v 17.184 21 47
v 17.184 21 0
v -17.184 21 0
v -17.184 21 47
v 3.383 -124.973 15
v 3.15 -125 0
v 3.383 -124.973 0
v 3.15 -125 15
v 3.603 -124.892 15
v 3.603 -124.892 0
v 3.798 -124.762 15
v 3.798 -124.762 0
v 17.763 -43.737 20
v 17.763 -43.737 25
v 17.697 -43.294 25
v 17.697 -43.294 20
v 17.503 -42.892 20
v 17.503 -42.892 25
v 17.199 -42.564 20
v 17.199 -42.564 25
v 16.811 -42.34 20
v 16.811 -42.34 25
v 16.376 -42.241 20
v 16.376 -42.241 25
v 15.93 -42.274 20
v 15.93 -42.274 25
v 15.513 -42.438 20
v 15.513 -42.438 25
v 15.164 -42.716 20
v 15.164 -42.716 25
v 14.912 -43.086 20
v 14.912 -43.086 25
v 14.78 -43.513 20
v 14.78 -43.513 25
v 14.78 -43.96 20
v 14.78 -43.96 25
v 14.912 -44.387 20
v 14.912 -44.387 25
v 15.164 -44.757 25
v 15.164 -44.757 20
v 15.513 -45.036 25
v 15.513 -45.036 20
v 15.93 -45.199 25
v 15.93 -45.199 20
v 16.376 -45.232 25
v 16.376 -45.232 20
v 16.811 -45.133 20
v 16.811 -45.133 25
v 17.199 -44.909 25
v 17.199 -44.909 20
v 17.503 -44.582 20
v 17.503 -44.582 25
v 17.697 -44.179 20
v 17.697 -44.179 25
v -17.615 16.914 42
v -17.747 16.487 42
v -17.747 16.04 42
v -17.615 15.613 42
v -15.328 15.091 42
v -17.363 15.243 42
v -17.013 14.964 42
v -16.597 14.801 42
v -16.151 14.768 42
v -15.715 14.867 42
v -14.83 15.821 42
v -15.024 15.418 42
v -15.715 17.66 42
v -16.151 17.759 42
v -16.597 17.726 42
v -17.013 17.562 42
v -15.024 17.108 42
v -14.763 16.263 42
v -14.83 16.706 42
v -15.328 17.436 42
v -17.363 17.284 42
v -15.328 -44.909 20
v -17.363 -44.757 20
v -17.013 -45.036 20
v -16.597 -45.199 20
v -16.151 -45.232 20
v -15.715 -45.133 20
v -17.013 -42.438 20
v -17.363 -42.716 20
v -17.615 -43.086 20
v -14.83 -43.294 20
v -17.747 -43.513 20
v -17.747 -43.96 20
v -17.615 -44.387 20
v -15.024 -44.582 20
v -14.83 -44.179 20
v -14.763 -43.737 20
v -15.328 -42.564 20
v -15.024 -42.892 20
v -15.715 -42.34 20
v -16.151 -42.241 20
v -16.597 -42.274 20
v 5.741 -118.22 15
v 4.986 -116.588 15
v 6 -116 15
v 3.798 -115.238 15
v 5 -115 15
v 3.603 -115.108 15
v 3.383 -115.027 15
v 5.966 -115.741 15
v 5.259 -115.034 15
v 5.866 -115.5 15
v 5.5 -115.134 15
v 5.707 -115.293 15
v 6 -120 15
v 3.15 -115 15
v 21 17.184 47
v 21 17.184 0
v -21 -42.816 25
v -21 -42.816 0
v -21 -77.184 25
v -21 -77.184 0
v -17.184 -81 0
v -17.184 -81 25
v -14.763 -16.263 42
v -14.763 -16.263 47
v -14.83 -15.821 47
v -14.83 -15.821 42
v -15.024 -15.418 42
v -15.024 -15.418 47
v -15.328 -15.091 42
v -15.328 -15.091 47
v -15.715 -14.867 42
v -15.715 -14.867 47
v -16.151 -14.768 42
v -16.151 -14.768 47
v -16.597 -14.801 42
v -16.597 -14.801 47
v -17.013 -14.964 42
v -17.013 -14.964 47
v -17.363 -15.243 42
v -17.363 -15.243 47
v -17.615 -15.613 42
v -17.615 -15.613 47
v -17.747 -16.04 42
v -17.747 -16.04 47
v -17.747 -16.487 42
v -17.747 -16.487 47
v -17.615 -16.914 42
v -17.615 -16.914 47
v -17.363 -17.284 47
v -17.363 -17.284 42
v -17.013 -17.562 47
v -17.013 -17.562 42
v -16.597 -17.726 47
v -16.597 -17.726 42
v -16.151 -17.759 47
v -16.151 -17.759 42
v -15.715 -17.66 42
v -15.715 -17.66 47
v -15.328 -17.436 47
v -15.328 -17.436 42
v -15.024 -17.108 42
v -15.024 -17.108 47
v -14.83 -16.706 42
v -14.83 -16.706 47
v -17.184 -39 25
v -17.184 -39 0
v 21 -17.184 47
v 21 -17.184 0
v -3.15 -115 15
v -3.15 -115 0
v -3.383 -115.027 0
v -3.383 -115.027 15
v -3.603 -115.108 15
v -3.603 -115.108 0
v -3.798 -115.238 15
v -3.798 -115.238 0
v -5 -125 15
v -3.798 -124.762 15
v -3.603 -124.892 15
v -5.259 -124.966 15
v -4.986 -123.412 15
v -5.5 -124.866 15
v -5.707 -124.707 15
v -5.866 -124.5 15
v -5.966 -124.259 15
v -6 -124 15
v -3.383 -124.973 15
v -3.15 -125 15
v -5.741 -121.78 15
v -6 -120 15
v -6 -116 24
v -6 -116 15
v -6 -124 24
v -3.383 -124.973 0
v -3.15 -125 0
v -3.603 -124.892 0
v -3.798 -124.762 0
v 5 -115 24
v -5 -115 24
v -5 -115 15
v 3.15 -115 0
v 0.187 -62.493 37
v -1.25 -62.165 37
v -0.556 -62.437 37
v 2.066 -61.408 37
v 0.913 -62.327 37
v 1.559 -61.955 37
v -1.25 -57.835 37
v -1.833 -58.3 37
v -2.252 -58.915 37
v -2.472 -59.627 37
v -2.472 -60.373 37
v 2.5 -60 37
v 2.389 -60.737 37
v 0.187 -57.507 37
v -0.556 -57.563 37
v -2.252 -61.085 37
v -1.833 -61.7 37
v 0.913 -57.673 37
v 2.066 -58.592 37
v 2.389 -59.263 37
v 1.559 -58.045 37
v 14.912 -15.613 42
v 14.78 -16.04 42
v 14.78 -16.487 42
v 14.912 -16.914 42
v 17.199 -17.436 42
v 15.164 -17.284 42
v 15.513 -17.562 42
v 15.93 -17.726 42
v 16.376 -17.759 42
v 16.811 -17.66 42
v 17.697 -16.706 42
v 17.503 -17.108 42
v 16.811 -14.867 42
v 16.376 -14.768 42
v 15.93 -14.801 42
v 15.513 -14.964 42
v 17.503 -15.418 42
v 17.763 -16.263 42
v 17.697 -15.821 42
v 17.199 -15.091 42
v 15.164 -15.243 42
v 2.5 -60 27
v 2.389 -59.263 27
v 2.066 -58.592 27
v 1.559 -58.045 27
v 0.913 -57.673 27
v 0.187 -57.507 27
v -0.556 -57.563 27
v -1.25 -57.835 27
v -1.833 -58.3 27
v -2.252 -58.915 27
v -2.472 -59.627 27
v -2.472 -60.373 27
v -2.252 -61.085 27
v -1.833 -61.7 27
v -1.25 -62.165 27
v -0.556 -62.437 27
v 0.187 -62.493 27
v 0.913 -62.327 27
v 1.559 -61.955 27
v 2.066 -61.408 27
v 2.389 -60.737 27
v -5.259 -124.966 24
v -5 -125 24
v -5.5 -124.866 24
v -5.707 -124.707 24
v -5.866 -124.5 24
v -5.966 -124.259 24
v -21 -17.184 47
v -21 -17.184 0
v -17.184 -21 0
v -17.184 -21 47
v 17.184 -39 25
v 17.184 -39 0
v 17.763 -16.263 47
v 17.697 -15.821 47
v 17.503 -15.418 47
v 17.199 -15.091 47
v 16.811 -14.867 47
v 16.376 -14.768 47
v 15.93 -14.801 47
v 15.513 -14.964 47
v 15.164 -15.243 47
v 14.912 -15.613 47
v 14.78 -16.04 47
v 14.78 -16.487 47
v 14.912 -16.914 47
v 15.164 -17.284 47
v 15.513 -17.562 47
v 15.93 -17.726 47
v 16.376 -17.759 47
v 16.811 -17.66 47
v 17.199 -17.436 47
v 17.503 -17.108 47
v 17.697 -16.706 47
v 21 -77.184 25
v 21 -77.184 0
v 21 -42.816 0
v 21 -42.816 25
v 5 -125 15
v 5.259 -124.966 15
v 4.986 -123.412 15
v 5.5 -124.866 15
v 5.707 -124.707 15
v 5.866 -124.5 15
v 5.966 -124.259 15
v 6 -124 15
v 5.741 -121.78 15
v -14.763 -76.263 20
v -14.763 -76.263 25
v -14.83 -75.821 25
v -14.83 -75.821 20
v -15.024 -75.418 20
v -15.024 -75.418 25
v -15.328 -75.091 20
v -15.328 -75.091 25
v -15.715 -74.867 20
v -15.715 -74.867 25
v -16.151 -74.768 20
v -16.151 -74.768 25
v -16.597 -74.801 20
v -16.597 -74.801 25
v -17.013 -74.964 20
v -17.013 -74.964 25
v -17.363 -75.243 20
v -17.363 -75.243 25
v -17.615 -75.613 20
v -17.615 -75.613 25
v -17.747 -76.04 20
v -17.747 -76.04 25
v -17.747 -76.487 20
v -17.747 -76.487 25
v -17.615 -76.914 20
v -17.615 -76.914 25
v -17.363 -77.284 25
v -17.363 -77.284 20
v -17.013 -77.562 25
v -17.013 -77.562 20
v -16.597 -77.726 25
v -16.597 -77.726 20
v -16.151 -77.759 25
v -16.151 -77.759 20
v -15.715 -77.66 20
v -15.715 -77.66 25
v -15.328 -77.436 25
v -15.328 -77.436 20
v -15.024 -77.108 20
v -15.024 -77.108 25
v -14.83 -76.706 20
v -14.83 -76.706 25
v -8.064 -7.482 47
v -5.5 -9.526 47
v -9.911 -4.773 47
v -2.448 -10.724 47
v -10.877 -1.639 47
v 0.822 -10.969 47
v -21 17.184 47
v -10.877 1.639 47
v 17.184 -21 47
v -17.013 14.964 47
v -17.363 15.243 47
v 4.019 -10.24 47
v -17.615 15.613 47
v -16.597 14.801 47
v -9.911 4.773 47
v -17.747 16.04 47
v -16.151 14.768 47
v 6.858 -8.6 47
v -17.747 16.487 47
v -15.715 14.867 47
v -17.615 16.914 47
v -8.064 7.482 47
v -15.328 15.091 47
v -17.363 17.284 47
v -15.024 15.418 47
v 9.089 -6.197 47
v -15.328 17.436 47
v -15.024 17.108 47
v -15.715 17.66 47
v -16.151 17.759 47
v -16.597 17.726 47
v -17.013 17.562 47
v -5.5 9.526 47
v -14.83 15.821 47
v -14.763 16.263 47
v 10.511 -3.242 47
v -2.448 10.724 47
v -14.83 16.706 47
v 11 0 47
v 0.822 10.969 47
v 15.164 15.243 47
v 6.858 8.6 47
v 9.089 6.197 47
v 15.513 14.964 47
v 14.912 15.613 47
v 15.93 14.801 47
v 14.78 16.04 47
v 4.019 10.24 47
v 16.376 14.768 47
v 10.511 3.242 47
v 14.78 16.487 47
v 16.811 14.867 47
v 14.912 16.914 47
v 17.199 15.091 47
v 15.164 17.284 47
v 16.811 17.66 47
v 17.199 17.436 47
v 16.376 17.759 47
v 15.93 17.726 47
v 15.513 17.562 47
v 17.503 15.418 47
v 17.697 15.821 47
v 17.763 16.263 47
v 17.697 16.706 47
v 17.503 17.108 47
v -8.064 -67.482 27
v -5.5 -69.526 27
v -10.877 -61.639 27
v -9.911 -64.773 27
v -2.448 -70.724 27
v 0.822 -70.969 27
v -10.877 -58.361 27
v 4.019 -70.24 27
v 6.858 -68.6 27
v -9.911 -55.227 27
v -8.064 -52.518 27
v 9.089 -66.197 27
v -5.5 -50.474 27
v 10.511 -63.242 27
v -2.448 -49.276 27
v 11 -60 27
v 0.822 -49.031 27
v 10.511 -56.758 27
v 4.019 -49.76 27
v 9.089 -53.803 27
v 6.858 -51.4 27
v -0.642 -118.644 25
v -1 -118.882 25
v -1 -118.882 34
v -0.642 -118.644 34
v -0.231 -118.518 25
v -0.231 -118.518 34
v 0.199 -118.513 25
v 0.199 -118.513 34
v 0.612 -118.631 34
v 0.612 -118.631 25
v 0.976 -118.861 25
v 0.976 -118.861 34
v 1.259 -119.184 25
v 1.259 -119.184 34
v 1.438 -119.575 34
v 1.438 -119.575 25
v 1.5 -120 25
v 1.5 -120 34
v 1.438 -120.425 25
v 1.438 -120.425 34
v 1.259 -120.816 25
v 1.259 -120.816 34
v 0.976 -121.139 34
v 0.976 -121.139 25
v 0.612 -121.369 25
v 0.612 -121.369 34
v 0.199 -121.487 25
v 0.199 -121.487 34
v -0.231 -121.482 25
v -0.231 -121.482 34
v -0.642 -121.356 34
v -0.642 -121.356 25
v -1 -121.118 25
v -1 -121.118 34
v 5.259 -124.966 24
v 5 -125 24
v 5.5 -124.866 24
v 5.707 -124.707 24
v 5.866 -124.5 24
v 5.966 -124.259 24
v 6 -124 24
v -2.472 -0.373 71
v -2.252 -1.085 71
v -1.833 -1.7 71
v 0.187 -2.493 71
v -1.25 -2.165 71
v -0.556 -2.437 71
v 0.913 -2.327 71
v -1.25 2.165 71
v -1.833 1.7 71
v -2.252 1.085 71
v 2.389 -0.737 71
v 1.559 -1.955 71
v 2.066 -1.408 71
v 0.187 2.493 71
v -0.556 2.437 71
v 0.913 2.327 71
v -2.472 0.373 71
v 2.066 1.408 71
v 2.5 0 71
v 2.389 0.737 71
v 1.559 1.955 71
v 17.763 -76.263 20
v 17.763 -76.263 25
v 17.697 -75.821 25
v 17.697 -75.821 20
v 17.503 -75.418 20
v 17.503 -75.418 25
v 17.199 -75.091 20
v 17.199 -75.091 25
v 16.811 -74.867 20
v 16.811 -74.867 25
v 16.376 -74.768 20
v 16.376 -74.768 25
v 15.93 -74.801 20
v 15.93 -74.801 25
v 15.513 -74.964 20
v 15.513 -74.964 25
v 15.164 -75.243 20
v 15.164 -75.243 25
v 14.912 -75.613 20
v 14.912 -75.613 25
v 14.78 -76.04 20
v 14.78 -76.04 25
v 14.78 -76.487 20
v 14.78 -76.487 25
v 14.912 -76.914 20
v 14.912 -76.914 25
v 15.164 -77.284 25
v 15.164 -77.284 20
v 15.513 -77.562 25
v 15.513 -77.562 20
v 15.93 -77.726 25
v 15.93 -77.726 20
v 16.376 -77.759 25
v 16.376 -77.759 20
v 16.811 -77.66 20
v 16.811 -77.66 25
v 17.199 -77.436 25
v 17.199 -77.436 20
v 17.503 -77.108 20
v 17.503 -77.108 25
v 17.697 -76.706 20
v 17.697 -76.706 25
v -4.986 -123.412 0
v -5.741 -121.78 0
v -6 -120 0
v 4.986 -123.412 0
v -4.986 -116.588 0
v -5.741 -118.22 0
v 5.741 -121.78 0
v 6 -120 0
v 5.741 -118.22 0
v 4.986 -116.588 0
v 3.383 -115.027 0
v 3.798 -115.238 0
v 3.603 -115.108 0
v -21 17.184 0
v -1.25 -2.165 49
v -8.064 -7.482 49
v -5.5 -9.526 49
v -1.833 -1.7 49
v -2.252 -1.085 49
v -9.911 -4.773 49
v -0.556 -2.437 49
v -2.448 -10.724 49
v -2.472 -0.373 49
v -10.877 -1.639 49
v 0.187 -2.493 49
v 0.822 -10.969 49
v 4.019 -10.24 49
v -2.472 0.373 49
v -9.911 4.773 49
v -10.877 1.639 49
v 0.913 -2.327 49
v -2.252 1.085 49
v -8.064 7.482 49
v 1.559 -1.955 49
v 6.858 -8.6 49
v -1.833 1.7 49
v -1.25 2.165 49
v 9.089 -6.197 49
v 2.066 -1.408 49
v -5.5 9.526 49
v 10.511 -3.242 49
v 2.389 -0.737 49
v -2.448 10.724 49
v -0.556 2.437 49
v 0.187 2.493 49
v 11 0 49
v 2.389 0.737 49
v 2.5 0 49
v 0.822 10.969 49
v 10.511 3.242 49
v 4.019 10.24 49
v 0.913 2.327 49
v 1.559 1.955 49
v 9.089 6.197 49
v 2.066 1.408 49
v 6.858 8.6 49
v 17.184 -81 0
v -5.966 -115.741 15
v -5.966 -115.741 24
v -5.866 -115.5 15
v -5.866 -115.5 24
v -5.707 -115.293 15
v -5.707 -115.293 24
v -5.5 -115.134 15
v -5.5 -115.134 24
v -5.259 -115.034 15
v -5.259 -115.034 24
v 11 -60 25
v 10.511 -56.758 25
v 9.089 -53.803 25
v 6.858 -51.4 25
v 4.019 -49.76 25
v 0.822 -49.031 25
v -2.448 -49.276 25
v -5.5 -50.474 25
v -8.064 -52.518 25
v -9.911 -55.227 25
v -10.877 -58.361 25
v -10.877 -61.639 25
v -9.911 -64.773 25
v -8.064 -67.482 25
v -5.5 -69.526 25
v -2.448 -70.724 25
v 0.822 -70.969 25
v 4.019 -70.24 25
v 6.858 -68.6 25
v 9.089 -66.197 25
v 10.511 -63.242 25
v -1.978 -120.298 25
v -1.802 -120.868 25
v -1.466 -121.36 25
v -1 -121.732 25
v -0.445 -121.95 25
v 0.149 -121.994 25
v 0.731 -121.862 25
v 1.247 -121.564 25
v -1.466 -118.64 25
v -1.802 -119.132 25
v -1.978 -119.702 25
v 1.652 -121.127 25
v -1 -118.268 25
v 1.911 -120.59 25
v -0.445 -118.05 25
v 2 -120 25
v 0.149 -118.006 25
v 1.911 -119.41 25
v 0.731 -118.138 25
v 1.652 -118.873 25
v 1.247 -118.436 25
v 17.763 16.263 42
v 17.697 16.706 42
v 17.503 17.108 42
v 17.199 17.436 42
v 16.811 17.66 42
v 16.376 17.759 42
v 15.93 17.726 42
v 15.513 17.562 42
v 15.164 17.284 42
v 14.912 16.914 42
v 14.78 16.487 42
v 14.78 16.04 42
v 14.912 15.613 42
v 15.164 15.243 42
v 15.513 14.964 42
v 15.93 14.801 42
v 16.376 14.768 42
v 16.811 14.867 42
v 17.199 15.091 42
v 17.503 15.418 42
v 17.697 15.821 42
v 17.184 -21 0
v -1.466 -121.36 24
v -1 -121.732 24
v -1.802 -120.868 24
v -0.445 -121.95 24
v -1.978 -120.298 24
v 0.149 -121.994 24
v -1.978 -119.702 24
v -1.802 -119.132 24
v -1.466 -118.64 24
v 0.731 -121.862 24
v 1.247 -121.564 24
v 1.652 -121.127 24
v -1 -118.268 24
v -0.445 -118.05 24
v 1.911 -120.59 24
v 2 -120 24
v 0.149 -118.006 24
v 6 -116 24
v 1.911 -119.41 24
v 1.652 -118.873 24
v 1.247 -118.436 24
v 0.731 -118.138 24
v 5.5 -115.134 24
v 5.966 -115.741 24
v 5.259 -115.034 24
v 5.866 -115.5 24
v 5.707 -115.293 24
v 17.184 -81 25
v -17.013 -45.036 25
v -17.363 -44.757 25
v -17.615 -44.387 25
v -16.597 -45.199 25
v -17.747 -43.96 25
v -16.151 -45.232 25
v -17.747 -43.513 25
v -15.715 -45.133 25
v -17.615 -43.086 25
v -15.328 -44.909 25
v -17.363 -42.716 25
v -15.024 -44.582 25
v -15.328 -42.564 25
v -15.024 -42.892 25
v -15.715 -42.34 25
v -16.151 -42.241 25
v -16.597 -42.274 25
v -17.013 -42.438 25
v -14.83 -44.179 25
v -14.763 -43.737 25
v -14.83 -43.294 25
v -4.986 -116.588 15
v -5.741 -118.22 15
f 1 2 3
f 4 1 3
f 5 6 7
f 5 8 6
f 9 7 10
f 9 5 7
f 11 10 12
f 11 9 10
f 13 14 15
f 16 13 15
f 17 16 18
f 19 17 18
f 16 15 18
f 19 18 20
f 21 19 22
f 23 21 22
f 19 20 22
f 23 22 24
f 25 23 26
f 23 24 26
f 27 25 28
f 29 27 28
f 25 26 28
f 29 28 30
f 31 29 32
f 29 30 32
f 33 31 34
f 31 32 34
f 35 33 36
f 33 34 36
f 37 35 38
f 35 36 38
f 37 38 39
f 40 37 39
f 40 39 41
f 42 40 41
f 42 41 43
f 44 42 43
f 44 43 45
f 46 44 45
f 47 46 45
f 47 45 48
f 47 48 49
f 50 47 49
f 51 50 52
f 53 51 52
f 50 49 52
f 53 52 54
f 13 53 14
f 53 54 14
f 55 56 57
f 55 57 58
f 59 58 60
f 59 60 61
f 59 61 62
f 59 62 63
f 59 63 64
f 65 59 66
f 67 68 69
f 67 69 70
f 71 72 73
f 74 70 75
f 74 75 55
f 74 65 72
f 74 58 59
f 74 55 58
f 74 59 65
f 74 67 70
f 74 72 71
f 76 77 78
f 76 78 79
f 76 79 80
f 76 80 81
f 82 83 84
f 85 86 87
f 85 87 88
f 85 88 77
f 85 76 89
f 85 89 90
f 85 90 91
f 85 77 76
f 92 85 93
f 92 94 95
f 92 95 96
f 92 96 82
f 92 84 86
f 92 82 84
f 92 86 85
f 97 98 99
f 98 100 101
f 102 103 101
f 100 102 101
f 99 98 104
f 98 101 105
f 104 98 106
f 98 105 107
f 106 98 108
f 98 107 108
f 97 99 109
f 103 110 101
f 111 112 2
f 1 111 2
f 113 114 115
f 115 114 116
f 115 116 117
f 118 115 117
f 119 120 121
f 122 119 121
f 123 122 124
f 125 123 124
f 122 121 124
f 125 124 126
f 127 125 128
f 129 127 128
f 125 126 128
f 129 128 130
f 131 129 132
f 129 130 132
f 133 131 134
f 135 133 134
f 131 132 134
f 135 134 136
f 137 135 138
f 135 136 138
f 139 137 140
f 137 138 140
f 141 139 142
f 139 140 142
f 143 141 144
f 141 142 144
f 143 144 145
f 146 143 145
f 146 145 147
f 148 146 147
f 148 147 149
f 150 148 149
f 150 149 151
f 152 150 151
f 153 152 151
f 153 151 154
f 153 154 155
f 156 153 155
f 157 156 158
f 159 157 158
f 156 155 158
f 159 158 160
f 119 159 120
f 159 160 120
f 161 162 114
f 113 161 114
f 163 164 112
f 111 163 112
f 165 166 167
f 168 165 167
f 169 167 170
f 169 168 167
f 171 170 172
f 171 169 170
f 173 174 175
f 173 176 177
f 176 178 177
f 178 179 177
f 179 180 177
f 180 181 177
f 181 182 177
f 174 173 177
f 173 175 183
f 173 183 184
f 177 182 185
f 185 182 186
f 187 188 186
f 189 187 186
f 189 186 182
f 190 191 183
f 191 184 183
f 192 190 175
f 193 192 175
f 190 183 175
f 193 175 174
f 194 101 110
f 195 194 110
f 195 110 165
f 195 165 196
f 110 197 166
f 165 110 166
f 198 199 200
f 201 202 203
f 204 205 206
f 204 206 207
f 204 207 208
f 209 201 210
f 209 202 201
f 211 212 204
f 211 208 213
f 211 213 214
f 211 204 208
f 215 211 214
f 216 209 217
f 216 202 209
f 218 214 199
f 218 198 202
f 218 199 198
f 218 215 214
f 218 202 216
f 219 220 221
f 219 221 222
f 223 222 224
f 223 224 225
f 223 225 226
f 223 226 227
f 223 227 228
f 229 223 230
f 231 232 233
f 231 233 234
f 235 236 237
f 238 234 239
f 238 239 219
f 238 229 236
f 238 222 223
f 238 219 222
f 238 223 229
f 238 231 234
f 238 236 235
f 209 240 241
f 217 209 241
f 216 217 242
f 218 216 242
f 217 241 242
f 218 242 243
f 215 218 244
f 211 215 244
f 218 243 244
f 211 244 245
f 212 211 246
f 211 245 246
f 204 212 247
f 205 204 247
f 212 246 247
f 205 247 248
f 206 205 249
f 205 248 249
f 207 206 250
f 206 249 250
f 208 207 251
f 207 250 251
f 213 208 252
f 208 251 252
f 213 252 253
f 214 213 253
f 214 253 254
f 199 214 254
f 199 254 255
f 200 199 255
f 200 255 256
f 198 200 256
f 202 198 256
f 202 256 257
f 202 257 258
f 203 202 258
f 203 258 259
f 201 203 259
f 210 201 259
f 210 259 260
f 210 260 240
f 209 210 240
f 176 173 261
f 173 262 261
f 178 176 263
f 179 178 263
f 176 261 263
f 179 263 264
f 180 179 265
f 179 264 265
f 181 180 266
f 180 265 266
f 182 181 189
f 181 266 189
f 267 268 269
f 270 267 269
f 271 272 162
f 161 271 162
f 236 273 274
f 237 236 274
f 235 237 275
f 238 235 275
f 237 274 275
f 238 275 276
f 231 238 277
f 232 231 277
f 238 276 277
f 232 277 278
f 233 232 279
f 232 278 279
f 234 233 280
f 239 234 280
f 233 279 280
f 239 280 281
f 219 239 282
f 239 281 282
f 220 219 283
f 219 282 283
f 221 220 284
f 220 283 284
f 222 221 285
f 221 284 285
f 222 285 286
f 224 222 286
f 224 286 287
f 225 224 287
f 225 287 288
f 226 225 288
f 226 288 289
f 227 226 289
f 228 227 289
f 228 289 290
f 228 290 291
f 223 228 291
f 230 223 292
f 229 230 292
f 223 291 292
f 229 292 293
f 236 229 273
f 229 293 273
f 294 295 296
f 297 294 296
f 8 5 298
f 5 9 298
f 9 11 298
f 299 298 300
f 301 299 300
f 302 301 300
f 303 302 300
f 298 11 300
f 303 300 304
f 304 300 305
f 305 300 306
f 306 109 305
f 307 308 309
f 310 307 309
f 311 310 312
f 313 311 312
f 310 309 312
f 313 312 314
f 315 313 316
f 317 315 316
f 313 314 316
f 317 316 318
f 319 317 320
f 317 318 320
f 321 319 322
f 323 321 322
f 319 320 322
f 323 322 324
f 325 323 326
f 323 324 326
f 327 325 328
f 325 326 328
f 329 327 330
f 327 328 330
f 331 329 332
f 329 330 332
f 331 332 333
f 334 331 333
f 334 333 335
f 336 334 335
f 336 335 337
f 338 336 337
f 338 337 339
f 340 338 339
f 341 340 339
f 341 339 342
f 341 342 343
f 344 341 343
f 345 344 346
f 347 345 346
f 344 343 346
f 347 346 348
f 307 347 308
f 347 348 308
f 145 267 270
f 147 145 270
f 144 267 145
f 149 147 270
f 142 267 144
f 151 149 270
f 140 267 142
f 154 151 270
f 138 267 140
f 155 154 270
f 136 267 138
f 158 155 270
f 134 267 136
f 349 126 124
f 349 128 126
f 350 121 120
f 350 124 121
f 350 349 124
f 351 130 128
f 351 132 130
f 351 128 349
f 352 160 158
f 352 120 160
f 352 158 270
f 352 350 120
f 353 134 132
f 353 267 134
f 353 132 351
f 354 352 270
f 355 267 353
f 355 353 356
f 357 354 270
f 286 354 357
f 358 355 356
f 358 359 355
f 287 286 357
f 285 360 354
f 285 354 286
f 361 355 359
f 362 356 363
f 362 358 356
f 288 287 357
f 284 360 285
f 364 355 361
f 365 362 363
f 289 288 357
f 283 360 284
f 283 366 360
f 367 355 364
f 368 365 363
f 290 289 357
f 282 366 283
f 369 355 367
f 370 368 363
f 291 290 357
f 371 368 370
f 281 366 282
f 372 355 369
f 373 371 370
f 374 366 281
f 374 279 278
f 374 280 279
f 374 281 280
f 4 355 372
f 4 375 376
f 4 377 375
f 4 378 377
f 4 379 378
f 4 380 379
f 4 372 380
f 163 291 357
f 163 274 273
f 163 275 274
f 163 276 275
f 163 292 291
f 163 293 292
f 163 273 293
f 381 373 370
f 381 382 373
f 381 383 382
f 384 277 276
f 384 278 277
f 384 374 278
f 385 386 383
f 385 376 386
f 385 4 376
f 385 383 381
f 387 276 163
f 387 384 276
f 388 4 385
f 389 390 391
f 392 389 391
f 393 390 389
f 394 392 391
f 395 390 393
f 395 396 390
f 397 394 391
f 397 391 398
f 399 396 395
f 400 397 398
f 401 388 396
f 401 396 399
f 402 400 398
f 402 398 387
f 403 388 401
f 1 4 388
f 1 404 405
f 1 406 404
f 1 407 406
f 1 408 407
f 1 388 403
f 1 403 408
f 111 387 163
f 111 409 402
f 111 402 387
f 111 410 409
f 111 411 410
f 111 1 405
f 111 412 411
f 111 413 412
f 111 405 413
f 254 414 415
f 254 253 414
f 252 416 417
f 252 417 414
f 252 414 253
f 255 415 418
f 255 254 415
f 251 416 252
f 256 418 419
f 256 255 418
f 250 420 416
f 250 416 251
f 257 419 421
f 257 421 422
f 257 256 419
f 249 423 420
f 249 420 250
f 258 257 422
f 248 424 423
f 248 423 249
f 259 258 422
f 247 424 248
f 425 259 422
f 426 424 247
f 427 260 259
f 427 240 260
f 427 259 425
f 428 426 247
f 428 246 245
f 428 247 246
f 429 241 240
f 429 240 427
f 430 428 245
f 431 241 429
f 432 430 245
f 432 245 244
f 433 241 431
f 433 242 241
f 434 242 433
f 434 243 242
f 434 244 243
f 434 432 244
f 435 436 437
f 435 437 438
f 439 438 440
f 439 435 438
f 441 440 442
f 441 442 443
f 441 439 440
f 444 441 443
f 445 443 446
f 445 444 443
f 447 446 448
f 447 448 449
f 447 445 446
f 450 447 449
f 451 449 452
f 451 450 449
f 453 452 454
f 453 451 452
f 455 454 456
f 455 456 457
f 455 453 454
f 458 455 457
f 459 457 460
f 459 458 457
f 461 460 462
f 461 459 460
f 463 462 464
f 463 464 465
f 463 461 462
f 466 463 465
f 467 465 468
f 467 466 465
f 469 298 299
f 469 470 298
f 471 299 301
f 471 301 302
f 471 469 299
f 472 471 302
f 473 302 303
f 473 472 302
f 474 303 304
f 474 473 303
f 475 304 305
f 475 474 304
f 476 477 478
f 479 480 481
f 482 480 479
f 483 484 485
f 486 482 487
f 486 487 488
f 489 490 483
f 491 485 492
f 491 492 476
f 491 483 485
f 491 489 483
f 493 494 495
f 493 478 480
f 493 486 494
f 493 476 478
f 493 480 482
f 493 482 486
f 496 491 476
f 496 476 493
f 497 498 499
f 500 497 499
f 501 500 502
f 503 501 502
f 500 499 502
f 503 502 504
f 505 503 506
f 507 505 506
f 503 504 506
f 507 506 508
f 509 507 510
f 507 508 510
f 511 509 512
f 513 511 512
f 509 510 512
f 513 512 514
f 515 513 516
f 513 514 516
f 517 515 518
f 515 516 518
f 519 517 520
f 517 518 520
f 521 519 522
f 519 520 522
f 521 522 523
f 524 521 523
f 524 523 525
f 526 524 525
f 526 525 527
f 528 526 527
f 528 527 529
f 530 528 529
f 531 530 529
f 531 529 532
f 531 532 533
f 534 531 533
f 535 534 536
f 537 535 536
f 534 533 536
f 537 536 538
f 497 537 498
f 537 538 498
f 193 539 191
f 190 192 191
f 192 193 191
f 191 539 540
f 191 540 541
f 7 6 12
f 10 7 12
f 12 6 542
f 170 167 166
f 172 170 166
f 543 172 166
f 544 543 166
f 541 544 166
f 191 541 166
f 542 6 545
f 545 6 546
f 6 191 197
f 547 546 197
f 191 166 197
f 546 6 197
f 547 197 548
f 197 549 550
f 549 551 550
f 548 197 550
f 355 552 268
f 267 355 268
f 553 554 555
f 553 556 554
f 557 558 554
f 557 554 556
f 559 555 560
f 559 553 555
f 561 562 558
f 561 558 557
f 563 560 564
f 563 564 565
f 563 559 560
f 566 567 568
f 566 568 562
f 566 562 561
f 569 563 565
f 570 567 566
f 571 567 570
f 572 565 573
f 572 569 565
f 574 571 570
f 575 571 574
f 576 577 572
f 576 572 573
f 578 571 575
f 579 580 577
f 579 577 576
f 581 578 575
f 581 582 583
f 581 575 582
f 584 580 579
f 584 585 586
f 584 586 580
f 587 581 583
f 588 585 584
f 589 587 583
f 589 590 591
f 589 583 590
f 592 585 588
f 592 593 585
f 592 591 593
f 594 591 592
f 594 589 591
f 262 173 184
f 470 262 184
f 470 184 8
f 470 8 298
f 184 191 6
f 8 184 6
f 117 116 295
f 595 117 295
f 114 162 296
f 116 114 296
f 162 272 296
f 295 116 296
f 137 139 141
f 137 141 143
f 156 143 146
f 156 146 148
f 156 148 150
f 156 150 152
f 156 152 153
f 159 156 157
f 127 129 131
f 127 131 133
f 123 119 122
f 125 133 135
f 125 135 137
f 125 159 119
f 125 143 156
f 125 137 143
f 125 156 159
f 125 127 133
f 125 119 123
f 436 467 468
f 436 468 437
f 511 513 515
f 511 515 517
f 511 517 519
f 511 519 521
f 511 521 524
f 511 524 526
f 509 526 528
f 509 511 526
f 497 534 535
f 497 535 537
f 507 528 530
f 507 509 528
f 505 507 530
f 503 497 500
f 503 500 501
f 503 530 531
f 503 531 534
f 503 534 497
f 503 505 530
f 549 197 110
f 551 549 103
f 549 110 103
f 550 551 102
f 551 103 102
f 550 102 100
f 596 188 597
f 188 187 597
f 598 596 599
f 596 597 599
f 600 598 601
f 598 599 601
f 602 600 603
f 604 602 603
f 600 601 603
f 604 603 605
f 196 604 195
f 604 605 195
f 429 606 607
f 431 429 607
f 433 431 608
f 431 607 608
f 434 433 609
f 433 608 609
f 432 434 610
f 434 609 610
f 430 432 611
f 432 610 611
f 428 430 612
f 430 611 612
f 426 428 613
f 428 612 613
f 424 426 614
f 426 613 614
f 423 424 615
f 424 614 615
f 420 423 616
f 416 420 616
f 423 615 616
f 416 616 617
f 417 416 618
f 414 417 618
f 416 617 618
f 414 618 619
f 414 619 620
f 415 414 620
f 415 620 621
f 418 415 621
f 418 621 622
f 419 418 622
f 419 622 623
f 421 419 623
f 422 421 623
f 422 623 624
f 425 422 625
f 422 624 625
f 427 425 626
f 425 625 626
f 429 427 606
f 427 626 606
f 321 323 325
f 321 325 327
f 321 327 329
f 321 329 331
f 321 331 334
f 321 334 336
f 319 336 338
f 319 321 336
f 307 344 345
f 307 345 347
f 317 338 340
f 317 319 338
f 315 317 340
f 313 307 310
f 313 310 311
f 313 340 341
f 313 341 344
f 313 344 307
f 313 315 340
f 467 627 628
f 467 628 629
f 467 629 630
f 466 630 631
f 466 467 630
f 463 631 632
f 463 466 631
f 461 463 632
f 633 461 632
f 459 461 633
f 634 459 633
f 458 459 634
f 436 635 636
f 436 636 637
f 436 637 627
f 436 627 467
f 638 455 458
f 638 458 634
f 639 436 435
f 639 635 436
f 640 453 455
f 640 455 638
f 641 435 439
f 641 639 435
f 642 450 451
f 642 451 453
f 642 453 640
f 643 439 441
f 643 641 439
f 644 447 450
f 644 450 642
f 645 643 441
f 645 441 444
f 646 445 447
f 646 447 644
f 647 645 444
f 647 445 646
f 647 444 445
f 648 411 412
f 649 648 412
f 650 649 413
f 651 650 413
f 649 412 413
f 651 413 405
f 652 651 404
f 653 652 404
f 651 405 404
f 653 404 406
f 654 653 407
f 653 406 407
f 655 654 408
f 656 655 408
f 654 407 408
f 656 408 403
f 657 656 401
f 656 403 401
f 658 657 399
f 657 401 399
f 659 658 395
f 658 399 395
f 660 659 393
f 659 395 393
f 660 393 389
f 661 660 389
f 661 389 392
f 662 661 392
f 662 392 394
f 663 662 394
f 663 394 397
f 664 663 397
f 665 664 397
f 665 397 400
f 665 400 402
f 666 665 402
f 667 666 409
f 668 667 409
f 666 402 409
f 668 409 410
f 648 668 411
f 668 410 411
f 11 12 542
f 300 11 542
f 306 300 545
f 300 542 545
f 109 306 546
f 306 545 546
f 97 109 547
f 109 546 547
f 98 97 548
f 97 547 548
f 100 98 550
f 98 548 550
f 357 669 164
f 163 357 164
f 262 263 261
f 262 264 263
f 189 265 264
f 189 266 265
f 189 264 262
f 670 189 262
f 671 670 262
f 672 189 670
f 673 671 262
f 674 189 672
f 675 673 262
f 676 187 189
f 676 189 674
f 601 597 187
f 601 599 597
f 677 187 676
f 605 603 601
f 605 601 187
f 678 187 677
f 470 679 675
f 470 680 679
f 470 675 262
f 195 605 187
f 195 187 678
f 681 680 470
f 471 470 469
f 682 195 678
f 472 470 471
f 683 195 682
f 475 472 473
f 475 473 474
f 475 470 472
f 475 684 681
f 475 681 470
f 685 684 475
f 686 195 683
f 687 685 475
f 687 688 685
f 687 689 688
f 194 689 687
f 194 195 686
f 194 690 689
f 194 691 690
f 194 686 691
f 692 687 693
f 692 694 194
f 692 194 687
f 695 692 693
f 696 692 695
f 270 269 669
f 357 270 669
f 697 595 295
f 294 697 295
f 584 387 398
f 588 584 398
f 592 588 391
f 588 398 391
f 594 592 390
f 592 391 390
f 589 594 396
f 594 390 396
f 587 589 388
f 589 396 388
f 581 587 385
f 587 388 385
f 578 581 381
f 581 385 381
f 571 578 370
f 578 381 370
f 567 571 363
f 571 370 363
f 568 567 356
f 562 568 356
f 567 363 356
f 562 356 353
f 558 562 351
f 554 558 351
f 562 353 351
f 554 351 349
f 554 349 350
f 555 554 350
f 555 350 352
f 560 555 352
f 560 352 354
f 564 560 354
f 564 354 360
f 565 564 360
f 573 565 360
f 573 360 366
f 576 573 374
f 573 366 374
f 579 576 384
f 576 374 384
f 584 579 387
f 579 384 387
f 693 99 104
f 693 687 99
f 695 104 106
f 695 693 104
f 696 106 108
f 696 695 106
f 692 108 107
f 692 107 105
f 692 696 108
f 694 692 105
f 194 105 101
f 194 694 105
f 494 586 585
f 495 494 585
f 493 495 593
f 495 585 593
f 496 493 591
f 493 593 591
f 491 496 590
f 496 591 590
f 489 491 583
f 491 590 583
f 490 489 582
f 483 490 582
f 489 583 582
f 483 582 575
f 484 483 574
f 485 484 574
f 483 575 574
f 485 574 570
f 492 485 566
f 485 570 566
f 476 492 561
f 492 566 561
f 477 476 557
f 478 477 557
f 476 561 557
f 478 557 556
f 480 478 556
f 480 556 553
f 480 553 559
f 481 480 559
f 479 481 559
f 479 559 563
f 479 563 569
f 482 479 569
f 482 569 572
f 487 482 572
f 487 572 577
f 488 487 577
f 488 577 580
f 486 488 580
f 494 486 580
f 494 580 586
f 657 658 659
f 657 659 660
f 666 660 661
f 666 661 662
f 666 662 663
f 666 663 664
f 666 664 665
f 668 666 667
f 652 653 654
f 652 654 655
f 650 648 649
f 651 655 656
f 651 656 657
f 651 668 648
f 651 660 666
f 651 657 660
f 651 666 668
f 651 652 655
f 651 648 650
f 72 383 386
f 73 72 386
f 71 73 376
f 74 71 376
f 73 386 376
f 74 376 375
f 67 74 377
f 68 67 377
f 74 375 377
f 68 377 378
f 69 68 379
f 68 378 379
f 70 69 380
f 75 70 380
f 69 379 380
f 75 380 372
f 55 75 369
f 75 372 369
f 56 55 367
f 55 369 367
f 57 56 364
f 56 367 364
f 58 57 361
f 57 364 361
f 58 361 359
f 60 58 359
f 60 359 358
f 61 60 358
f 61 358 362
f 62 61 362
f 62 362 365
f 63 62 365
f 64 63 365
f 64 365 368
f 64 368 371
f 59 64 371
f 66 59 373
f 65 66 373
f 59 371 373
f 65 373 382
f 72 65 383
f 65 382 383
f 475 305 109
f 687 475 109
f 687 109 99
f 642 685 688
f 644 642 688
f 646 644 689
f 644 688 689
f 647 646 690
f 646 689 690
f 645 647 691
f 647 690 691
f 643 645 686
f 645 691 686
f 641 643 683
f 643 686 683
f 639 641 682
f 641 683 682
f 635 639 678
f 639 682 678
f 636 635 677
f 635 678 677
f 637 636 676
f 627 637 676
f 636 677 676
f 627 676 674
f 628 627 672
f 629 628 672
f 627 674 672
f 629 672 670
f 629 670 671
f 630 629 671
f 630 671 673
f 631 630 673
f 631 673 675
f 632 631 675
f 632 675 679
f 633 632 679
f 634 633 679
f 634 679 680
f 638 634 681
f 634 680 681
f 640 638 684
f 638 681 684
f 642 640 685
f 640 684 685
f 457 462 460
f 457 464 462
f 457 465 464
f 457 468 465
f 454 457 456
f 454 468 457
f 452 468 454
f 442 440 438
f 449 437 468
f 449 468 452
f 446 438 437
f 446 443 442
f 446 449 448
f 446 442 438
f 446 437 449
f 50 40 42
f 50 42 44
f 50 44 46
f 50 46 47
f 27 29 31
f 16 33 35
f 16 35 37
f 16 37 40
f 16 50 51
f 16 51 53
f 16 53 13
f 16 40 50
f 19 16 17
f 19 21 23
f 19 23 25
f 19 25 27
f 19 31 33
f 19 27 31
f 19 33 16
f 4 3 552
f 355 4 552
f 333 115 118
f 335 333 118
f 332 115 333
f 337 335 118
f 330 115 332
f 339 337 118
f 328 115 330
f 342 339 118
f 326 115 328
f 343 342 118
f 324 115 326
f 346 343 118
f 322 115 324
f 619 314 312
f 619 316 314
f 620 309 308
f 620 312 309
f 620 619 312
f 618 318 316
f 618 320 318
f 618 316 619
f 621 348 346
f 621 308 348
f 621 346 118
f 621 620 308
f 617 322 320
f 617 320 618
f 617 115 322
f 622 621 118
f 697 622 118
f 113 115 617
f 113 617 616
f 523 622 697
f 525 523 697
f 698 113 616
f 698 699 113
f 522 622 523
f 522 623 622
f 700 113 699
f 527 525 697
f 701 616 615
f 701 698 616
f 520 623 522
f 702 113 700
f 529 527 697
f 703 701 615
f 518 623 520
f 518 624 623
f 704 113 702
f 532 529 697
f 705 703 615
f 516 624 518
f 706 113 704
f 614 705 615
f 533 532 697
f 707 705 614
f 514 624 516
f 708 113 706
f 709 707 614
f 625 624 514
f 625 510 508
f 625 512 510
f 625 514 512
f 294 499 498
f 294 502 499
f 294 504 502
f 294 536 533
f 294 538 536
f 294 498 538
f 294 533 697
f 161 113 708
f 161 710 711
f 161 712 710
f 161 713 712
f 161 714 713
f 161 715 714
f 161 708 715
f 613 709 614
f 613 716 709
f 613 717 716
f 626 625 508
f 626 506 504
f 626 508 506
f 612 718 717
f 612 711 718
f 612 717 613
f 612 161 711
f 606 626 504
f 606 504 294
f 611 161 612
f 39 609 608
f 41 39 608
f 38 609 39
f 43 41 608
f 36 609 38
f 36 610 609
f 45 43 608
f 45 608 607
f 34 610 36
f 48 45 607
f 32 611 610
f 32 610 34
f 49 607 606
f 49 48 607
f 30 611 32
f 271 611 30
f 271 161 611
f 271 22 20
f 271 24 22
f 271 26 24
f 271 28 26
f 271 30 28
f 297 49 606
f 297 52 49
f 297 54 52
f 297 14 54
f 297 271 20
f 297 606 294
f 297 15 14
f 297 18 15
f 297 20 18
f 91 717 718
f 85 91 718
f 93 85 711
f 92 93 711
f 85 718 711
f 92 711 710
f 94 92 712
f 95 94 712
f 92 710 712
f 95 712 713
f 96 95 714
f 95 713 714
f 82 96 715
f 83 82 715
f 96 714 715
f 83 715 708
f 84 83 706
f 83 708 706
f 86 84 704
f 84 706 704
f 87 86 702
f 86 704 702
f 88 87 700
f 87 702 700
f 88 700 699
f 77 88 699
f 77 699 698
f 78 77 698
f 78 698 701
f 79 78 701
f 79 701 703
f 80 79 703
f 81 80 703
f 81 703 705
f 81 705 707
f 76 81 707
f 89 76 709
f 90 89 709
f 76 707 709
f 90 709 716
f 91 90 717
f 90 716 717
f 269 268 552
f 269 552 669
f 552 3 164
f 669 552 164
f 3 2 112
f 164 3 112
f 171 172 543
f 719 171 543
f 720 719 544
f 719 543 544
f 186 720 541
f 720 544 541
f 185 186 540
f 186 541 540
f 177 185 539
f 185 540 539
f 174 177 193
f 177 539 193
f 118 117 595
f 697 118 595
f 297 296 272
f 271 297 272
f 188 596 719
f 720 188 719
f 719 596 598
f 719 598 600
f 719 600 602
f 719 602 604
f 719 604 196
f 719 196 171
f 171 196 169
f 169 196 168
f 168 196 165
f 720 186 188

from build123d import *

# Parameters (mm, degrees)
F3_DEPTH  = 47
F4_R      = 11
F4_R_2    = 2.5
F5_DEPTH  = 2
F6_DEPTH  = 24
F4_R_3    = 1.5
F7_DEPTH  = 5
F8_DEPTH  = 25
F9_R      = 1.5
F10_DEPTH = 5
F9_R_2    = 11
F9_R_3    = 2.5
F11_DEPTH = 2
F12_DEPTH = 12
F14_DEPTH = 15
F16_DEPTH = 9
F17_R     = 2
F18_DEPTH = 1
F19_DEPTH = 10
F20_R     = 1
F21_R     = 1


with BuildPart() as f3:
    # F2 (on Top) → F3 (new body)
    with BuildSketch(Plane.XY):
        Polygon((-17.1837661841, 21), (-21, 17.1837661841), (-21, -17.1837661841), (-17.1837661841, -21), (17.1837661841, -21), (21, -17.1837661841), (21, 17.1837661841), (17.1837661841, 21), align=None)
    extrude(amount=F3_DEPTH)

    # F4 (on face) → F5 (join)
    with BuildSketch(Plane.XY.offset(47)):
        Circle(F4_R)
        Circle(F4_R_2, mode=Mode.SUBTRACT)
    extrude(amount=F5_DEPTH)

    # F6 (add): a face of the model
    f6_faces = [f3.faces().sort_by_distance(p)[0] for p in [
        (0, 0, 47),
    ]]
    extrude(f6_faces, amount=F6_DEPTH)

    # F4 (on face) → F7 (cut)
    with BuildSketch(Plane.XY.offset(47)):
        with Locations((16.2634559673, -16.2634559673)):
            Circle(F4_R_3)
        with Locations((16.2634559673, 16.2634559673)):
            Circle(F4_R_3)
        with Locations((-16.2634559673, 16.2634559673)):
            Circle(F4_R_3)
        with Locations((-16.2634559673, -16.2634559673)):
            Circle(F4_R_3)
    extrude(amount=-F7_DEPTH, mode=Mode.SUBTRACT)


with BuildPart() as f8:
    # F2 (on Top) → F8 (new body)
    with BuildSketch(Plane.XY):
        Polygon((-17.1837661841, -39), (-21, -42.8162338159), (-21, -77.1837661841), (-17.1837661841, -81), (17.1837661841, -81), (21, -77.1837661841), (21, -42.8162338159), (17.1837661841, -39), align=None)
    extrude(amount=F8_DEPTH)

    # F9 (on face) → F10 (cut)
    with BuildSketch(Plane.XY.offset(25)):
        with Locations((-16.2634559673, -76.2634559673)):
            Circle(F9_R)
        with Locations((16.2634559673, -76.2634559673)):
            Circle(F9_R)
        with Locations((16.2634559673, -43.7365440327)):
            Circle(F9_R)
        with Locations((-16.2634559673, -43.7365440327)):
            Circle(F9_R)
    extrude(amount=-F10_DEPTH, mode=Mode.SUBTRACT)

    # F9 (on face) → F11 (join)
    with BuildSketch(Plane.XY.offset(25)):
        with Locations((0, -60)):
            Circle(F9_R_2)
        with Locations((0, -60)):
            Circle(F9_R_3, mode=Mode.SUBTRACT)
    extrude(amount=F11_DEPTH)

    # F9 (on face) → F12 (join)
    with BuildSketch(Plane.XY.offset(25)):
        with Locations((0, -60)):
            Circle(F9_R_3)
    extrude(amount=F12_DEPTH)


with BuildPart() as f14:
    # F13 (on Top) → F14 (new body)
    with BuildSketch(Plane.XY):
        with BuildLine():
            Line((3.5, -115), (-3.5, -115))
            ThreePointArc((-3.5, -115), (-6, -120), (-3.5, -125))
            Line((-3.5, -125), (3.5, -125))
            ThreePointArc((3.5, -125), (6, -120), (3.5, -115))
        make_face()
    extrude(amount=F14_DEPTH)

    # F15 (on face) → F16 (join)
    with BuildSketch(Plane.XY.offset(15)):
        with BuildLine():
            Line((-6, -125), (-3.5, -125))
            ThreePointArc((-3.5, -125), (-5.3401699437, -122.7950849719), (-6, -120))
            Line((-6, -120), (-6, -125))
        make_face()
        with BuildLine():
            Line((-6, -115), (-6, -120))
            ThreePointArc((-6, -120), (-5.3401699437, -117.2049150281), (-3.5, -115))
            Line((-3.5, -115), (-6, -115))
        make_face()
        with BuildLine():
            Line((-3.5, -125), (3.5, -125))
            ThreePointArc((3.5, -125), (5.3401699437, -122.7950849719), (6, -120))
            ThreePointArc((6, -120), (5.3401699437, -117.2049150281), (3.5, -115))
            Line((3.5, -115), (-3.5, -115))
            ThreePointArc((-3.5, -115), (-5.3401699437, -117.2049150281), (-6, -120))
            ThreePointArc((-6, -120), (-5.3401699437, -122.7950849719), (-3.5, -125))
        make_face()
        with BuildLine():
            ThreePointArc((3.5, -115), (5.3401699437, -117.2049150281), (6, -120))
            Line((6, -120), (6, -115))
            Line((6, -115), (3.5, -115))
        make_face()
        with BuildLine():
            Line((3.5, -125), (6, -125))
            Line((6, -125), (6, -120))
            ThreePointArc((6, -120), (5.3401699437, -122.7950849719), (3.5, -125))
        make_face()
    extrude(amount=F16_DEPTH)

    # F17 (on face) → F18 (join)
    with BuildSketch(Plane.XY.offset(24)):
        with Locations((0, -120)):
            Circle(F17_R)
        with BuildLine():
            Line((-1, -121.1180339887), (-1, -118.8819660113))
            ThreePointArc((-1, -118.8819660113), (1.5, -120), (-1, -121.1180339887))
        make_face(mode=Mode.SUBTRACT)
    extrude(amount=F18_DEPTH)

    # F19 (add): a face of the model
    f19_faces = [f14.faces().sort_by_distance(p)[0] for p in [
        (0.1480240656, -120, 24),
    ]]
    extrude(f19_faces, amount=F19_DEPTH)

    # F20
    f20_edges = [f14.edges().sort_by_distance(p)[0] for p in [
        (6, -125, 19.5),
        (6, -115, 19.5),
        (-6, -115, 19.5),
        (-6, -125, 19.5),
    ]]
    fillet(f20_edges, radius=F20_R)

    # F21
    f21_edges = [f14.edges().sort_by_distance(p)[0] for p in [
        (3.5, -125, 7.5),
        (-3.5, -125, 7.5),
        (3.5, -115, 7.5),
        (-3.5, -115, 7.5),
    ]]
    fillet(f21_edges, radius=F21_R)


solid = Compound([f3.part, f8.part, f14.part])
